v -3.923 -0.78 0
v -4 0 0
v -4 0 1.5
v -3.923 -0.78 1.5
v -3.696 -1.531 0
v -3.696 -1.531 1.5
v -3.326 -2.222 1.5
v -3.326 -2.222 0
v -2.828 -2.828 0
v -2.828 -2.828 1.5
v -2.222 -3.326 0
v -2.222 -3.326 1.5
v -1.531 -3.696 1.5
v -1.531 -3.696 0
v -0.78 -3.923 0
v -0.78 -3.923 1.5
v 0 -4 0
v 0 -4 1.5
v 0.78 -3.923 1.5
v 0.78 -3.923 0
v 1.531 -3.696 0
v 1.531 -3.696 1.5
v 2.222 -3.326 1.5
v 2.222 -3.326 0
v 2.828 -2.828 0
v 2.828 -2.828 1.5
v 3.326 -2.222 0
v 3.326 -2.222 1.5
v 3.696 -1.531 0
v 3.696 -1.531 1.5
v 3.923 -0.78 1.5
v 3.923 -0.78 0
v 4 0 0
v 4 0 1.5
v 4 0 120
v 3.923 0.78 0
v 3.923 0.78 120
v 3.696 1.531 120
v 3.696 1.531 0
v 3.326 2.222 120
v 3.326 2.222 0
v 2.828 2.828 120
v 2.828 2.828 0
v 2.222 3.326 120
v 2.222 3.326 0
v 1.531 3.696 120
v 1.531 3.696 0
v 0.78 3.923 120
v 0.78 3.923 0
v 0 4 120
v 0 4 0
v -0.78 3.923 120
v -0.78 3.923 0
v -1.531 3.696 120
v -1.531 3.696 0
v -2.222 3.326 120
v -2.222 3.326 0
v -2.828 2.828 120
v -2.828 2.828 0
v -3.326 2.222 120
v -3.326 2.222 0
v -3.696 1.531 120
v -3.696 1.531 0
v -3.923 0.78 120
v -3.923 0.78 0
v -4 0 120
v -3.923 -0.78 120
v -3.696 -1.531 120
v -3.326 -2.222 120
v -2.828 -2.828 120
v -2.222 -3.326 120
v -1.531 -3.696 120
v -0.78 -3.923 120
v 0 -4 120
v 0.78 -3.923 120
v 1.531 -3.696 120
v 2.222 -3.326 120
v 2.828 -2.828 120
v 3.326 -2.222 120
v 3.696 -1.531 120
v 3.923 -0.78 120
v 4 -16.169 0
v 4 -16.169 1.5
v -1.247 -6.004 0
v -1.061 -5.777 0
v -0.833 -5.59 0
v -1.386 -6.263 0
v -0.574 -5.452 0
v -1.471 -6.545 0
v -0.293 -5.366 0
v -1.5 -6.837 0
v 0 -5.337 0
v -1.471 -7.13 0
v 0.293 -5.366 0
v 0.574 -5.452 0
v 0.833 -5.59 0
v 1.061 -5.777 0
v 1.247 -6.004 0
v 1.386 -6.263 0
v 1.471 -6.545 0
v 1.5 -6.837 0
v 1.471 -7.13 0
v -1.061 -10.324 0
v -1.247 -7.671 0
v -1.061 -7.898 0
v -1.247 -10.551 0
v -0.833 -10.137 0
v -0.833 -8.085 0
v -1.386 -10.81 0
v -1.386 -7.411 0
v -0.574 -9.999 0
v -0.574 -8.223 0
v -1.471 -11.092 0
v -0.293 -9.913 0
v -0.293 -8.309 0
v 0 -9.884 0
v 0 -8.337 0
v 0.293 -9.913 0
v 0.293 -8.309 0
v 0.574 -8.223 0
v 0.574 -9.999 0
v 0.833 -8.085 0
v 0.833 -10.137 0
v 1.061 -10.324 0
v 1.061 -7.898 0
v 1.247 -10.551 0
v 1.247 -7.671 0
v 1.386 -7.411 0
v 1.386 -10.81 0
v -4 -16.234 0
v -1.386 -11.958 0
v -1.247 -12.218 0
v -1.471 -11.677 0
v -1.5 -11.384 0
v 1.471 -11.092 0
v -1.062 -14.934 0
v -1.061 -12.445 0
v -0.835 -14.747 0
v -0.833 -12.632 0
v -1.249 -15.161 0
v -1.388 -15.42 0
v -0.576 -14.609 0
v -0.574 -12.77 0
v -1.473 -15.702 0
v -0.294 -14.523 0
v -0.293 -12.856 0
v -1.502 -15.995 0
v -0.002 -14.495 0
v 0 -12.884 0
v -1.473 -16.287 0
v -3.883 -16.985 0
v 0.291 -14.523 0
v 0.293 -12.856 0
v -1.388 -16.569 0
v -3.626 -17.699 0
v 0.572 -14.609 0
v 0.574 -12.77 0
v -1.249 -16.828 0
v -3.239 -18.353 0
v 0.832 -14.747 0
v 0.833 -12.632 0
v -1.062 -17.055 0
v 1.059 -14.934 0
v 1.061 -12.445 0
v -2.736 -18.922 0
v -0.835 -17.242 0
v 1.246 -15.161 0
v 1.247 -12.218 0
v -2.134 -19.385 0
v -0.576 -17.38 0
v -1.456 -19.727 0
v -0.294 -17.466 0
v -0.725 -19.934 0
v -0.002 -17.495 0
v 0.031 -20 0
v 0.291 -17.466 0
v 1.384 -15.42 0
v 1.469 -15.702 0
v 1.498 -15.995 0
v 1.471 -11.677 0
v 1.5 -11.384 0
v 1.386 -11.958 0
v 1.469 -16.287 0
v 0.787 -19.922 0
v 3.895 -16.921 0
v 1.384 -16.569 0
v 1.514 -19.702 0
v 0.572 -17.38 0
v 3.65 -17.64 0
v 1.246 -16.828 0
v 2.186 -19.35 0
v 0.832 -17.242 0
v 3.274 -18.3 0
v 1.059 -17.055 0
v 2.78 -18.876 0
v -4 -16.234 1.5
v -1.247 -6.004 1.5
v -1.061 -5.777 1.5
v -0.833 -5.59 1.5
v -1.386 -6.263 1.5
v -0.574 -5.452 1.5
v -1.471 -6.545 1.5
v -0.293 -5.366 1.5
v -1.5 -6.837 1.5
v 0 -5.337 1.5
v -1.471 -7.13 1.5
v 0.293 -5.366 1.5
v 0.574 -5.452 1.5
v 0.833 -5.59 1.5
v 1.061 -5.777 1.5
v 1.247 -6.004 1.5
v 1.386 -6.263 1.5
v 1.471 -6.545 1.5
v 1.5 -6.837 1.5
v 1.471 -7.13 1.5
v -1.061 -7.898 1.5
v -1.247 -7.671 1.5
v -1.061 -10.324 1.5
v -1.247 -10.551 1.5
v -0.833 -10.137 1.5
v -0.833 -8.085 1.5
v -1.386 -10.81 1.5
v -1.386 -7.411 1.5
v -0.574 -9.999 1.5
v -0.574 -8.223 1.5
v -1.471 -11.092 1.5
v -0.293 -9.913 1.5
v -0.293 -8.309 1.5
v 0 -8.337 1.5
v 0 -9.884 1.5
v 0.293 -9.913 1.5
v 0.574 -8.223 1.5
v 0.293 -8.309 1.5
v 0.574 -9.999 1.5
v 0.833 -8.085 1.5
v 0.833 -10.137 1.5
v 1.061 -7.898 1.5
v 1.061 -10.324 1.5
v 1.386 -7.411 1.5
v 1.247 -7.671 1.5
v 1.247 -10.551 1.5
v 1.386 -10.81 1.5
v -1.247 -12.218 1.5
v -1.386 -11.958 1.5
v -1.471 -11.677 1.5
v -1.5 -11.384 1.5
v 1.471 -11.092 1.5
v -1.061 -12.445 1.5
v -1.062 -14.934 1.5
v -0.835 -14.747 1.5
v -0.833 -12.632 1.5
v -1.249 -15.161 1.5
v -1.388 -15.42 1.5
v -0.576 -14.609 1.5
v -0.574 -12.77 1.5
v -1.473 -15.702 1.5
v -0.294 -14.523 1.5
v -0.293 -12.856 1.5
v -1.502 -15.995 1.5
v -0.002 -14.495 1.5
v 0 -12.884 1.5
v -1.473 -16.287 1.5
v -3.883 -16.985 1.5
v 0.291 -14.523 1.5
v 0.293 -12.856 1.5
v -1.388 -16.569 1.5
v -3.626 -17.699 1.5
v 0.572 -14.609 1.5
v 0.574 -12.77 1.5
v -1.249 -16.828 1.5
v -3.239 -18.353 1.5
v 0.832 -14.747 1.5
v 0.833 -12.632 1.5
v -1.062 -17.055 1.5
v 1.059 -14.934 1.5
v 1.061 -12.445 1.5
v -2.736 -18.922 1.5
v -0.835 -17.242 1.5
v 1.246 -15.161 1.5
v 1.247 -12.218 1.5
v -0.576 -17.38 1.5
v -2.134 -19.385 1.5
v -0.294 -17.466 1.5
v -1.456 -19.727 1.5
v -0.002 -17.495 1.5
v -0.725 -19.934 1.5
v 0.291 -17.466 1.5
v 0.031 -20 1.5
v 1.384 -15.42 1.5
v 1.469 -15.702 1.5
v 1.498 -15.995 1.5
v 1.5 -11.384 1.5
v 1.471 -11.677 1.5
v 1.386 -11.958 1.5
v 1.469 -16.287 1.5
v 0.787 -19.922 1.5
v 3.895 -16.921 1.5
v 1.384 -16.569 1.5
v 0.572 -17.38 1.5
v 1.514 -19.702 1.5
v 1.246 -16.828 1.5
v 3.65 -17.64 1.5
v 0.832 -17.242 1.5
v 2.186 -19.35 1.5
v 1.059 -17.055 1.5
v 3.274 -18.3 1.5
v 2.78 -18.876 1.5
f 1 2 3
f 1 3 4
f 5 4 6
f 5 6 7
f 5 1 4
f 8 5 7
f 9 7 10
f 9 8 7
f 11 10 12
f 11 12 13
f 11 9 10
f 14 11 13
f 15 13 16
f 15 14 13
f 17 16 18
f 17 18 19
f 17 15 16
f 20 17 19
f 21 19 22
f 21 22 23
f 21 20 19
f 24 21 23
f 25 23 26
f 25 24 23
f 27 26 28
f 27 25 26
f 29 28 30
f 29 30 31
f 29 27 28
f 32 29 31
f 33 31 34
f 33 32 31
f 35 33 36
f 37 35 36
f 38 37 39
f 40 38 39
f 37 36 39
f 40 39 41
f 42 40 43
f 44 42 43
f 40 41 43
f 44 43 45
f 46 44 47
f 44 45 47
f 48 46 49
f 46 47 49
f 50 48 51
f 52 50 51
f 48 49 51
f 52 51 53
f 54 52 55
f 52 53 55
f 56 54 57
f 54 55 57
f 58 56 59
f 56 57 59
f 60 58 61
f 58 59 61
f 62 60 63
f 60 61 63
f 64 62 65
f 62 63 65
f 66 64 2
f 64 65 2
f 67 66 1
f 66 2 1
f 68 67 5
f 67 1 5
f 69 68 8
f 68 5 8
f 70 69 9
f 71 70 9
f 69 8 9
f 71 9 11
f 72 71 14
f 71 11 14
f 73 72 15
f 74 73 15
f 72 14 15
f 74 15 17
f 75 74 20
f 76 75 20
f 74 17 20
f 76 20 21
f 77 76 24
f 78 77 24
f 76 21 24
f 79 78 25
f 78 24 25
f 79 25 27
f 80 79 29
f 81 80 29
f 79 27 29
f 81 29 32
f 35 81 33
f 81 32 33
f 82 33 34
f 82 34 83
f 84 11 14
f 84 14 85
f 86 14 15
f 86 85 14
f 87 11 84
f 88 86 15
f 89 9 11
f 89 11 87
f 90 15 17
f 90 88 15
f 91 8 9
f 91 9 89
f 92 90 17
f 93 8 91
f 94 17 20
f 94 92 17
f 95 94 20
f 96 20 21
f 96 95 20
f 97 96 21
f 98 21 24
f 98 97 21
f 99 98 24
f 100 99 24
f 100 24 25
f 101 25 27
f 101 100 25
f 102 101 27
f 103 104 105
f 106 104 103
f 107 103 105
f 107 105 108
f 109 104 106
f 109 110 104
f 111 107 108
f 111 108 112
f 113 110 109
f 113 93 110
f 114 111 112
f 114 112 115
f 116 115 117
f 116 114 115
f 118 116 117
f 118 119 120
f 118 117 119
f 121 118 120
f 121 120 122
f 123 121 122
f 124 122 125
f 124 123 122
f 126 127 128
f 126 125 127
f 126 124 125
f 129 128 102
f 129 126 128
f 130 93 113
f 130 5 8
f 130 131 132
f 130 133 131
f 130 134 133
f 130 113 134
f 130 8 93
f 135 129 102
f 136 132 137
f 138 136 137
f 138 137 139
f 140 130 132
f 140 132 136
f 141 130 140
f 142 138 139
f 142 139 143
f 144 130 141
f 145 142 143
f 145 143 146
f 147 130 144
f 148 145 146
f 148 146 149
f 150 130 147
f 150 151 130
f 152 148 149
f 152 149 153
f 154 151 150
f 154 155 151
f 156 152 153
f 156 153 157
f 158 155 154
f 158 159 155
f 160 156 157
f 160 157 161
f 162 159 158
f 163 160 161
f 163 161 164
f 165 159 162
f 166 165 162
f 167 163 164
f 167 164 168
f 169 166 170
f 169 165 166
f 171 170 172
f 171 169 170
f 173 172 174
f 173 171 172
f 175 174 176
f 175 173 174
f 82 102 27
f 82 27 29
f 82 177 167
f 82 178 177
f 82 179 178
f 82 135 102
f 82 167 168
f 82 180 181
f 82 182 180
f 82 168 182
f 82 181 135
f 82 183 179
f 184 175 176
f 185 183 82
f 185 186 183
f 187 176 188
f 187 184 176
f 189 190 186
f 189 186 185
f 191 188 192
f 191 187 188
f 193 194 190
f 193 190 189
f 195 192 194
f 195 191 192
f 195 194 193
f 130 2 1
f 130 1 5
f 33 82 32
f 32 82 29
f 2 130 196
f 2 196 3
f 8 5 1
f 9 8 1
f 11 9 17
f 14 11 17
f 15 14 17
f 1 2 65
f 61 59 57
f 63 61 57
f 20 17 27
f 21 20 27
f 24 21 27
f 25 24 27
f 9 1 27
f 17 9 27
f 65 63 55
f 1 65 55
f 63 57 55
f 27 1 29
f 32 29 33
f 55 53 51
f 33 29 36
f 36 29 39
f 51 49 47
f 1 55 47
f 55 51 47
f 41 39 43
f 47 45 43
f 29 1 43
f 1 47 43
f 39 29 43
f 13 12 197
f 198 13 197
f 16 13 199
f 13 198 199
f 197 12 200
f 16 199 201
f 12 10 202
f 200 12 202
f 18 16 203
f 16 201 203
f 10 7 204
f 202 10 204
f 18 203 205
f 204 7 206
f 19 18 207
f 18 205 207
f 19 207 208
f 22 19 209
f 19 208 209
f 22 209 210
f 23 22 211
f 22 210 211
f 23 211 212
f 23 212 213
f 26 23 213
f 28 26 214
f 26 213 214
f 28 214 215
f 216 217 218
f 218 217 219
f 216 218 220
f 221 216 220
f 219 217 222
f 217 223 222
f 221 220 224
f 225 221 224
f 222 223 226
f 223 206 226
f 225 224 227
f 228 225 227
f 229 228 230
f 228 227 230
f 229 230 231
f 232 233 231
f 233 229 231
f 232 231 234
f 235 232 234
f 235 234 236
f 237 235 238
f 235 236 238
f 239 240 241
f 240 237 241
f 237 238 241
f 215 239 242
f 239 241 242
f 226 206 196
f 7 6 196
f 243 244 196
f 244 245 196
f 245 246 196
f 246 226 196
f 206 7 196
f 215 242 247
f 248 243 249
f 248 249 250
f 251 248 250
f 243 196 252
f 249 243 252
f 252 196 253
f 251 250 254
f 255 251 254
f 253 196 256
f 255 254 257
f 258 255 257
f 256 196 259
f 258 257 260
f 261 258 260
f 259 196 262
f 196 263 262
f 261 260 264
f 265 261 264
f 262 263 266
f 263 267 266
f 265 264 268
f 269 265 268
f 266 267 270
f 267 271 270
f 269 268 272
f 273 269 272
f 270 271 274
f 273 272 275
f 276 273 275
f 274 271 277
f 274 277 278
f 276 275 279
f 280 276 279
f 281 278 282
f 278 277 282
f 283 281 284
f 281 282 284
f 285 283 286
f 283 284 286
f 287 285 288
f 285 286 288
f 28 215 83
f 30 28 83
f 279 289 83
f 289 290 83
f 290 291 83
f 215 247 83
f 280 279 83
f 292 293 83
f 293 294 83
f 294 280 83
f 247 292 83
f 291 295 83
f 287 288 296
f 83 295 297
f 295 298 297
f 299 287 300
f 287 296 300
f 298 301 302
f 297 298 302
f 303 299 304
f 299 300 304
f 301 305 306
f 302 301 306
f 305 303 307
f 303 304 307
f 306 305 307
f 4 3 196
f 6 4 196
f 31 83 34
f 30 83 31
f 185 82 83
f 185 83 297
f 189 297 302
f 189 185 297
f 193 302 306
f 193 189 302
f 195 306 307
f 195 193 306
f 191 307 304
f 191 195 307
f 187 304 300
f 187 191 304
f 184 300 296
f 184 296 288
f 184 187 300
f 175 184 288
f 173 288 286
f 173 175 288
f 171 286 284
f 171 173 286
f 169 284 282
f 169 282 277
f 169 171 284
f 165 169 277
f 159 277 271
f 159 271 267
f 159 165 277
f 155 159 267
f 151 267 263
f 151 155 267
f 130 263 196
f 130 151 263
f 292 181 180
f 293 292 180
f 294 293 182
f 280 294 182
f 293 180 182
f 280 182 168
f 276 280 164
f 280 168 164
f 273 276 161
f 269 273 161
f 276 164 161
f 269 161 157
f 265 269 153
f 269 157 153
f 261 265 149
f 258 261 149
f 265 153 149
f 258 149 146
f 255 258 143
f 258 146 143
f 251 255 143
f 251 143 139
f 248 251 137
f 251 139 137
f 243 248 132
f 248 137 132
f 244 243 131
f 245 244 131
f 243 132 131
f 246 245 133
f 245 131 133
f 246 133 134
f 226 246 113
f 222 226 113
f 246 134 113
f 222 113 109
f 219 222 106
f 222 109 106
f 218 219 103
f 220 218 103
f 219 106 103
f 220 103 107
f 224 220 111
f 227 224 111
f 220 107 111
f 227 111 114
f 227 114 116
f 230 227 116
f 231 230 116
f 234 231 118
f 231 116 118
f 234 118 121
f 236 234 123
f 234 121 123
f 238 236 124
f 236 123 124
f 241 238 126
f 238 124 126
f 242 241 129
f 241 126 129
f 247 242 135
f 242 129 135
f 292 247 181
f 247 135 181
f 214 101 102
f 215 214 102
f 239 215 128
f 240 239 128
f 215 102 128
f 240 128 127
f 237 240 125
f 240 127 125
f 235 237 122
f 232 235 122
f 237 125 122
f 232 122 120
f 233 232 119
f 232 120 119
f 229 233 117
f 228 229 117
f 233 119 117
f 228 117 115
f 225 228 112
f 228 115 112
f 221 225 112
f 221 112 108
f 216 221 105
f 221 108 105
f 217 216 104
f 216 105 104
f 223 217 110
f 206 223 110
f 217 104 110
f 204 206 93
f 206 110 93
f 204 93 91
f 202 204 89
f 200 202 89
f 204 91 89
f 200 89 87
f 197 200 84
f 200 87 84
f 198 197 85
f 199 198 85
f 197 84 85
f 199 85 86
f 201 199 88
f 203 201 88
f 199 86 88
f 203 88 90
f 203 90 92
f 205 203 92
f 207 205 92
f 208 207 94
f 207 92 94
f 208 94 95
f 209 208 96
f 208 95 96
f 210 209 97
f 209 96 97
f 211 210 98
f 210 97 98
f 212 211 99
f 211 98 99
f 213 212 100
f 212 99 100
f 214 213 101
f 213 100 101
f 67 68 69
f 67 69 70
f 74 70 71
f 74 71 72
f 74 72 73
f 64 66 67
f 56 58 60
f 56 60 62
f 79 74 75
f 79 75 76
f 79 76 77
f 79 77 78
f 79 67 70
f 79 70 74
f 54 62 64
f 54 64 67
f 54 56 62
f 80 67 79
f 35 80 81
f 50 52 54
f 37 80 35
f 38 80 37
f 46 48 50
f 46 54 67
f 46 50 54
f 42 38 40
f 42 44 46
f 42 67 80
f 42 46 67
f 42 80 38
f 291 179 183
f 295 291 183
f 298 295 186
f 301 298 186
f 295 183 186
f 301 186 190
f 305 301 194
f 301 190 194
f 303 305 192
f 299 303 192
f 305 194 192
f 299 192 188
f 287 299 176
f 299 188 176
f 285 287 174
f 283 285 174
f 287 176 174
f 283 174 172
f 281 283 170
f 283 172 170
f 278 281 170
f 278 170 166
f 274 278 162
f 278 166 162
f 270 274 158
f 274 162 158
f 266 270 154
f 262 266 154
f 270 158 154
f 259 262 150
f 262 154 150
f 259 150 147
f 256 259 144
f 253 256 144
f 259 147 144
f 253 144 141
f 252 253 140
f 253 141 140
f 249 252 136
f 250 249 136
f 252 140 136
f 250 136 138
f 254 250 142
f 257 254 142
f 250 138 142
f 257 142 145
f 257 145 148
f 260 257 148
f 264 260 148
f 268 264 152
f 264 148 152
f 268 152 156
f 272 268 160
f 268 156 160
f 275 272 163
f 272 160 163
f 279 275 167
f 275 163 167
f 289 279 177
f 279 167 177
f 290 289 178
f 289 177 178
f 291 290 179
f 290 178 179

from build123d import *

# Parameters (mm, degrees)
F0_R     = 4
F1_DEPTH = 120
F2_R     = 1.5
F3_DEPTH = 1.5


with BuildPart() as f1:
    # F0 (on Top) → F1 (new body)
    with BuildSketch(Plane.XY):
        Circle(F0_R)
    extrude(amount=F1_DEPTH)


with BuildPart() as f3:
    # F2 (on face) → F3 (new body)
    with BuildSketch(Plane(origin=(0, 0, 0), x_dir=(1, 0, 0), z_dir=(0, 0, -1))):
        with BuildLine():
            Line((-4, 16.234326), (-4, 0))
            ThreePointArc((-4, 0), (0, 4), (4, 0))
            Line((4, 0), (4, 16.168817))
            ThreePointArc((4, 16.168817), (0.031103, 19.999866), (-4, 16.234326))
        make_face()
        with Locations((0, 6.837347)):
            Circle(F2_R, mode=Mode.SUBTRACT)
        with Locations((-0.001696, 15.99451)):
            Circle(F2_R, mode=Mode.SUBTRACT)
        with Locations((0, 11.384373)):
            Circle(F2_R, mode=Mode.SUBTRACT)
    extrude(amount=-F3_DEPTH)


solid = Compound([f1.part, f3.part])
